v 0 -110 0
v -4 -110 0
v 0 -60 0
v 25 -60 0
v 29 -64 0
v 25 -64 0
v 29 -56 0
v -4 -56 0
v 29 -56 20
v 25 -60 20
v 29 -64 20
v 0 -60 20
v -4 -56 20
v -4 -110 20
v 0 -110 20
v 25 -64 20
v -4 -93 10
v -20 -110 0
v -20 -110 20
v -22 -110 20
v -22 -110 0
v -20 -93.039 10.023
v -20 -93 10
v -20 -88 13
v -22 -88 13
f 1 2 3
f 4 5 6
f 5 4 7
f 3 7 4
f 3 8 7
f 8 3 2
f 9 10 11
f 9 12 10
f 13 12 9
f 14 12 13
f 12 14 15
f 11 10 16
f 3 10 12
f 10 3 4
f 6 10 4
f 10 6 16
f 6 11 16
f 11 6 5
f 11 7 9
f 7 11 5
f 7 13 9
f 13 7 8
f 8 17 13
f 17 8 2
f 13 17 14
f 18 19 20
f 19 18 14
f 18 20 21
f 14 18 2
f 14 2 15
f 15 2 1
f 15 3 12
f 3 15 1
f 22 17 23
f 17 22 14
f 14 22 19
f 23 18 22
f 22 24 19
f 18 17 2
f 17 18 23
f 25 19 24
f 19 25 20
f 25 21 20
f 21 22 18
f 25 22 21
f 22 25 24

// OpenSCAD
    
linear_extrude (height=20, $fn = 200)
import (file="profil.dxf", layer="2", $fn=500);

translate ([0,-110,0])
rotate([0,270,0])
linear_extrude (height=20, $fn = 200) polygon(points=[[0,0],[20,0],[10,17]]);

translate ([-20,-110,0])
rotate([0,270,0])
linear_extrude (height=2, $fn = 200) polygon(points=[[0,0],[20,0],[13,22]]);
